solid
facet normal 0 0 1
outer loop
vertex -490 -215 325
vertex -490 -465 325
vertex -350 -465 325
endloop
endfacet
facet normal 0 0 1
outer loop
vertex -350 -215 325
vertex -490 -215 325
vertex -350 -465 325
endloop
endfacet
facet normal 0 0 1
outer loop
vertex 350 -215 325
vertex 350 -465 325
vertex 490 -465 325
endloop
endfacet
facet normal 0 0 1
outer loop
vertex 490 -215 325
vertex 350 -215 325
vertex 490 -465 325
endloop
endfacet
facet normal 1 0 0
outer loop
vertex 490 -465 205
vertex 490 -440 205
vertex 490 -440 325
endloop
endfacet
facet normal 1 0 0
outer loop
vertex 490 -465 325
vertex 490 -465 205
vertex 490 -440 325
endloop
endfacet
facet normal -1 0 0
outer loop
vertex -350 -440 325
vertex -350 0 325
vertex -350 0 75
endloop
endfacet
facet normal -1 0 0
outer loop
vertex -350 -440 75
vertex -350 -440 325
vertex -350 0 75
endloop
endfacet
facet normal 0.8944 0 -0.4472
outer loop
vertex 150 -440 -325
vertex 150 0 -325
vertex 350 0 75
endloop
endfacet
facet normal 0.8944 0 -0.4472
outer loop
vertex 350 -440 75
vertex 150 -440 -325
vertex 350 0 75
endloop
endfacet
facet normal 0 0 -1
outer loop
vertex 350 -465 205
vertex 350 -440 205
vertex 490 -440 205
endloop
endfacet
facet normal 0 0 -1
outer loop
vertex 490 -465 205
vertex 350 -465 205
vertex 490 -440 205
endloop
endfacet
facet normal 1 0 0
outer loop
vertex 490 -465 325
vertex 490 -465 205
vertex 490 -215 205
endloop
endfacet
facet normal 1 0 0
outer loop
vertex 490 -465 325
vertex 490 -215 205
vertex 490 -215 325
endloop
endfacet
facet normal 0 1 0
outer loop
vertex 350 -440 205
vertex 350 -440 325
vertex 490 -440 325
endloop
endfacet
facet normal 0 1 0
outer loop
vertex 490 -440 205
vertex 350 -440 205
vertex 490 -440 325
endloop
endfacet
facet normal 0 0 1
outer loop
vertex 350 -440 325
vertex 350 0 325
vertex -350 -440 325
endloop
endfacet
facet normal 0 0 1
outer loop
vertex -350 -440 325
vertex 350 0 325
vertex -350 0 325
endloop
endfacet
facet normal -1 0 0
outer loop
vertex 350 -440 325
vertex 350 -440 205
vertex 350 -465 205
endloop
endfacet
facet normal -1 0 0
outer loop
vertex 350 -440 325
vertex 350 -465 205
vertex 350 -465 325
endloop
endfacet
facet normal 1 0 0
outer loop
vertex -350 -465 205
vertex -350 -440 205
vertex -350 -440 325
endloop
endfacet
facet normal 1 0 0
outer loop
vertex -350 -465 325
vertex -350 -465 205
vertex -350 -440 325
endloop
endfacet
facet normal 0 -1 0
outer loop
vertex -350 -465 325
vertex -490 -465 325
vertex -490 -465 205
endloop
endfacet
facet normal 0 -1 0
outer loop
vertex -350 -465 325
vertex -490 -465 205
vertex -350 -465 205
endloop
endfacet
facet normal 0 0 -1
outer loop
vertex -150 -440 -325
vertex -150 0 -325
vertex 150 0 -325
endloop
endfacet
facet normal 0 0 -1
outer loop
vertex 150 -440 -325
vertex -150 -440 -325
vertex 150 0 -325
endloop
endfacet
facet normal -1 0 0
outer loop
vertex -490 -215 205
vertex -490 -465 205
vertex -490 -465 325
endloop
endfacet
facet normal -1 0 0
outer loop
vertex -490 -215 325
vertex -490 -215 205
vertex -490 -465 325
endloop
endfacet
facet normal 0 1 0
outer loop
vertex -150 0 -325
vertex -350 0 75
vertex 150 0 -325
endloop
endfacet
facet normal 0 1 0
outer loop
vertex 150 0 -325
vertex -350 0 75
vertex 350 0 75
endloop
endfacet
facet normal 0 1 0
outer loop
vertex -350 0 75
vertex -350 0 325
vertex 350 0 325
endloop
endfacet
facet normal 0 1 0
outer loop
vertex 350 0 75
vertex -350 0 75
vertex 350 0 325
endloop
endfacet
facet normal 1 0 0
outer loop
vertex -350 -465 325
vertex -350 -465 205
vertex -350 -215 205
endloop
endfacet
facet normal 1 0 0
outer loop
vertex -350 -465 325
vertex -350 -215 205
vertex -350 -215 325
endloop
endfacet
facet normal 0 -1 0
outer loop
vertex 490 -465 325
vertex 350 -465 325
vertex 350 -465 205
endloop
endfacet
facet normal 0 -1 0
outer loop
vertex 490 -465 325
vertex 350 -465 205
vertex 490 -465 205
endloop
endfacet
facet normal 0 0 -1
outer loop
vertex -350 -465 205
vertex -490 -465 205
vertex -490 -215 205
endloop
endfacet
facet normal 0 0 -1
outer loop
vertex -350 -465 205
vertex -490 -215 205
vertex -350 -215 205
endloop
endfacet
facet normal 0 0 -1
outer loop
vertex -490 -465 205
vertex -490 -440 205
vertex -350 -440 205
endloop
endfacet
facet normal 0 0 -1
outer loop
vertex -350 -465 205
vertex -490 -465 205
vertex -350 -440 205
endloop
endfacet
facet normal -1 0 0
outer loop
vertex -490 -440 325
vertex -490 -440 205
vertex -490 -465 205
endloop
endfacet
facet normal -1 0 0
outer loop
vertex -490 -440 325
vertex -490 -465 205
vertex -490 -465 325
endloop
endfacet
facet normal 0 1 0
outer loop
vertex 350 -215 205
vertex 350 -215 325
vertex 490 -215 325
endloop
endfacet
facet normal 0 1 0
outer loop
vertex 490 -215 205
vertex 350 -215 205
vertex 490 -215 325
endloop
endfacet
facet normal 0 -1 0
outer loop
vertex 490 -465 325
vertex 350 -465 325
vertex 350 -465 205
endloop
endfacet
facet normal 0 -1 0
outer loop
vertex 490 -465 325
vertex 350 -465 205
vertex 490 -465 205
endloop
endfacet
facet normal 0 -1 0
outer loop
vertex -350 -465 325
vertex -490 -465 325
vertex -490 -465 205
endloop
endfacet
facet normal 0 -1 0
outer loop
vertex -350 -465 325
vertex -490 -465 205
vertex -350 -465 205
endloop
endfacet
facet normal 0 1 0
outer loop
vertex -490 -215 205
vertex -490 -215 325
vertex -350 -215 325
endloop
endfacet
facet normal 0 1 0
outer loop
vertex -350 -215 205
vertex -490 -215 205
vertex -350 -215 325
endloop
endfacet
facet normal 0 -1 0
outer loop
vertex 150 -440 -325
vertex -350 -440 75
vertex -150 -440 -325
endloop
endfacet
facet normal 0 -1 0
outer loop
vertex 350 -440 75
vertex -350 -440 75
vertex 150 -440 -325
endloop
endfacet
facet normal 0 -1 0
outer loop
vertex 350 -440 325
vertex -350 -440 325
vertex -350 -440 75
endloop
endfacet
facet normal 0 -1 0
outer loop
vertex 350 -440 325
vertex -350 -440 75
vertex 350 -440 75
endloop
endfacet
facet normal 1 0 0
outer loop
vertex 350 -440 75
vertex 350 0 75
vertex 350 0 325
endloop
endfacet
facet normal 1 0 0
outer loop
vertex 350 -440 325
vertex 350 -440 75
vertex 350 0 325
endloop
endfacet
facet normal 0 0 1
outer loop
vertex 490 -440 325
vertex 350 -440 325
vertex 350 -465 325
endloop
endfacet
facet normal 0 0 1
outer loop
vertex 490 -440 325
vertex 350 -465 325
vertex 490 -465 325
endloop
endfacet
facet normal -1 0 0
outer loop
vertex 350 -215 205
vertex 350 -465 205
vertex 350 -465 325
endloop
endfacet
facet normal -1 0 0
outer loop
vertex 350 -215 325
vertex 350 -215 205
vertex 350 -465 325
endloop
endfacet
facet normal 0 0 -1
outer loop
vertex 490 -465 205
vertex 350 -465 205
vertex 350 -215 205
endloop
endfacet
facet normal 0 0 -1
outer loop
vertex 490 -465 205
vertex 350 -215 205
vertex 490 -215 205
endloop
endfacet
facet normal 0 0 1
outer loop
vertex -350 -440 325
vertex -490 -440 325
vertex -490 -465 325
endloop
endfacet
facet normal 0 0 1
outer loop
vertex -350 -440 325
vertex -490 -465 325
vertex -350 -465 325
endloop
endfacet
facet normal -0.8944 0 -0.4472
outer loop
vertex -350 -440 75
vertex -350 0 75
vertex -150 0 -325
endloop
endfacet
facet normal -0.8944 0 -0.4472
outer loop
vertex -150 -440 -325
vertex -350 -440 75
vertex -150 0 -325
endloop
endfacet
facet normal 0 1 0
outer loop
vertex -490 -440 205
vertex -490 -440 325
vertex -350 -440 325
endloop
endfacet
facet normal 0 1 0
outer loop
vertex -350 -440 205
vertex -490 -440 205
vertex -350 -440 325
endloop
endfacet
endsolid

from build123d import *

# Parameters (mm, degrees)
F1_DEPTH  = 440
F2_W      = 140
F2_H      = 120
F3_DEPTH  = 25
F3_FACE_W = 140
F3_FACE_H = 120
F4_DEPTH  = 250


with BuildPart() as f1:
    # F0 (on Front) → F1 (new body)
    with BuildSketch(Plane.XZ):
        Polygon((-150, -325), (150, -325), (350, 75), (350, 325), (-350, 325), (-350, 75), align=None)
    extrude(amount=F1_DEPTH)


with BuildPart() as f3:
    # F2 (on face) → F3 (new body)
    with BuildSketch(Plane.XZ.offset(440)):
        with Locations((-420, 265)):
            Rectangle(F2_W, F2_H)
        with Locations((420, 265)):
            Rectangle(F2_W, F2_H)
    extrude(amount=F3_DEPTH)


with BuildPart() as f4:
    # F3_face (on face) → F4 (new body)
    with BuildSketch(Plane(origin=(-420, -465, 265), x_dir=(1, 0, 0), z_dir=(0, -1, 0))):
        Rectangle(F3_FACE_W, F3_FACE_H)
        with Locations((840, 0)):
            Rectangle(F3_FACE_W, F3_FACE_H)
    extrude(amount=-F4_DEPTH)


solid = Compound([f1.part, f3.part, f4.part])
